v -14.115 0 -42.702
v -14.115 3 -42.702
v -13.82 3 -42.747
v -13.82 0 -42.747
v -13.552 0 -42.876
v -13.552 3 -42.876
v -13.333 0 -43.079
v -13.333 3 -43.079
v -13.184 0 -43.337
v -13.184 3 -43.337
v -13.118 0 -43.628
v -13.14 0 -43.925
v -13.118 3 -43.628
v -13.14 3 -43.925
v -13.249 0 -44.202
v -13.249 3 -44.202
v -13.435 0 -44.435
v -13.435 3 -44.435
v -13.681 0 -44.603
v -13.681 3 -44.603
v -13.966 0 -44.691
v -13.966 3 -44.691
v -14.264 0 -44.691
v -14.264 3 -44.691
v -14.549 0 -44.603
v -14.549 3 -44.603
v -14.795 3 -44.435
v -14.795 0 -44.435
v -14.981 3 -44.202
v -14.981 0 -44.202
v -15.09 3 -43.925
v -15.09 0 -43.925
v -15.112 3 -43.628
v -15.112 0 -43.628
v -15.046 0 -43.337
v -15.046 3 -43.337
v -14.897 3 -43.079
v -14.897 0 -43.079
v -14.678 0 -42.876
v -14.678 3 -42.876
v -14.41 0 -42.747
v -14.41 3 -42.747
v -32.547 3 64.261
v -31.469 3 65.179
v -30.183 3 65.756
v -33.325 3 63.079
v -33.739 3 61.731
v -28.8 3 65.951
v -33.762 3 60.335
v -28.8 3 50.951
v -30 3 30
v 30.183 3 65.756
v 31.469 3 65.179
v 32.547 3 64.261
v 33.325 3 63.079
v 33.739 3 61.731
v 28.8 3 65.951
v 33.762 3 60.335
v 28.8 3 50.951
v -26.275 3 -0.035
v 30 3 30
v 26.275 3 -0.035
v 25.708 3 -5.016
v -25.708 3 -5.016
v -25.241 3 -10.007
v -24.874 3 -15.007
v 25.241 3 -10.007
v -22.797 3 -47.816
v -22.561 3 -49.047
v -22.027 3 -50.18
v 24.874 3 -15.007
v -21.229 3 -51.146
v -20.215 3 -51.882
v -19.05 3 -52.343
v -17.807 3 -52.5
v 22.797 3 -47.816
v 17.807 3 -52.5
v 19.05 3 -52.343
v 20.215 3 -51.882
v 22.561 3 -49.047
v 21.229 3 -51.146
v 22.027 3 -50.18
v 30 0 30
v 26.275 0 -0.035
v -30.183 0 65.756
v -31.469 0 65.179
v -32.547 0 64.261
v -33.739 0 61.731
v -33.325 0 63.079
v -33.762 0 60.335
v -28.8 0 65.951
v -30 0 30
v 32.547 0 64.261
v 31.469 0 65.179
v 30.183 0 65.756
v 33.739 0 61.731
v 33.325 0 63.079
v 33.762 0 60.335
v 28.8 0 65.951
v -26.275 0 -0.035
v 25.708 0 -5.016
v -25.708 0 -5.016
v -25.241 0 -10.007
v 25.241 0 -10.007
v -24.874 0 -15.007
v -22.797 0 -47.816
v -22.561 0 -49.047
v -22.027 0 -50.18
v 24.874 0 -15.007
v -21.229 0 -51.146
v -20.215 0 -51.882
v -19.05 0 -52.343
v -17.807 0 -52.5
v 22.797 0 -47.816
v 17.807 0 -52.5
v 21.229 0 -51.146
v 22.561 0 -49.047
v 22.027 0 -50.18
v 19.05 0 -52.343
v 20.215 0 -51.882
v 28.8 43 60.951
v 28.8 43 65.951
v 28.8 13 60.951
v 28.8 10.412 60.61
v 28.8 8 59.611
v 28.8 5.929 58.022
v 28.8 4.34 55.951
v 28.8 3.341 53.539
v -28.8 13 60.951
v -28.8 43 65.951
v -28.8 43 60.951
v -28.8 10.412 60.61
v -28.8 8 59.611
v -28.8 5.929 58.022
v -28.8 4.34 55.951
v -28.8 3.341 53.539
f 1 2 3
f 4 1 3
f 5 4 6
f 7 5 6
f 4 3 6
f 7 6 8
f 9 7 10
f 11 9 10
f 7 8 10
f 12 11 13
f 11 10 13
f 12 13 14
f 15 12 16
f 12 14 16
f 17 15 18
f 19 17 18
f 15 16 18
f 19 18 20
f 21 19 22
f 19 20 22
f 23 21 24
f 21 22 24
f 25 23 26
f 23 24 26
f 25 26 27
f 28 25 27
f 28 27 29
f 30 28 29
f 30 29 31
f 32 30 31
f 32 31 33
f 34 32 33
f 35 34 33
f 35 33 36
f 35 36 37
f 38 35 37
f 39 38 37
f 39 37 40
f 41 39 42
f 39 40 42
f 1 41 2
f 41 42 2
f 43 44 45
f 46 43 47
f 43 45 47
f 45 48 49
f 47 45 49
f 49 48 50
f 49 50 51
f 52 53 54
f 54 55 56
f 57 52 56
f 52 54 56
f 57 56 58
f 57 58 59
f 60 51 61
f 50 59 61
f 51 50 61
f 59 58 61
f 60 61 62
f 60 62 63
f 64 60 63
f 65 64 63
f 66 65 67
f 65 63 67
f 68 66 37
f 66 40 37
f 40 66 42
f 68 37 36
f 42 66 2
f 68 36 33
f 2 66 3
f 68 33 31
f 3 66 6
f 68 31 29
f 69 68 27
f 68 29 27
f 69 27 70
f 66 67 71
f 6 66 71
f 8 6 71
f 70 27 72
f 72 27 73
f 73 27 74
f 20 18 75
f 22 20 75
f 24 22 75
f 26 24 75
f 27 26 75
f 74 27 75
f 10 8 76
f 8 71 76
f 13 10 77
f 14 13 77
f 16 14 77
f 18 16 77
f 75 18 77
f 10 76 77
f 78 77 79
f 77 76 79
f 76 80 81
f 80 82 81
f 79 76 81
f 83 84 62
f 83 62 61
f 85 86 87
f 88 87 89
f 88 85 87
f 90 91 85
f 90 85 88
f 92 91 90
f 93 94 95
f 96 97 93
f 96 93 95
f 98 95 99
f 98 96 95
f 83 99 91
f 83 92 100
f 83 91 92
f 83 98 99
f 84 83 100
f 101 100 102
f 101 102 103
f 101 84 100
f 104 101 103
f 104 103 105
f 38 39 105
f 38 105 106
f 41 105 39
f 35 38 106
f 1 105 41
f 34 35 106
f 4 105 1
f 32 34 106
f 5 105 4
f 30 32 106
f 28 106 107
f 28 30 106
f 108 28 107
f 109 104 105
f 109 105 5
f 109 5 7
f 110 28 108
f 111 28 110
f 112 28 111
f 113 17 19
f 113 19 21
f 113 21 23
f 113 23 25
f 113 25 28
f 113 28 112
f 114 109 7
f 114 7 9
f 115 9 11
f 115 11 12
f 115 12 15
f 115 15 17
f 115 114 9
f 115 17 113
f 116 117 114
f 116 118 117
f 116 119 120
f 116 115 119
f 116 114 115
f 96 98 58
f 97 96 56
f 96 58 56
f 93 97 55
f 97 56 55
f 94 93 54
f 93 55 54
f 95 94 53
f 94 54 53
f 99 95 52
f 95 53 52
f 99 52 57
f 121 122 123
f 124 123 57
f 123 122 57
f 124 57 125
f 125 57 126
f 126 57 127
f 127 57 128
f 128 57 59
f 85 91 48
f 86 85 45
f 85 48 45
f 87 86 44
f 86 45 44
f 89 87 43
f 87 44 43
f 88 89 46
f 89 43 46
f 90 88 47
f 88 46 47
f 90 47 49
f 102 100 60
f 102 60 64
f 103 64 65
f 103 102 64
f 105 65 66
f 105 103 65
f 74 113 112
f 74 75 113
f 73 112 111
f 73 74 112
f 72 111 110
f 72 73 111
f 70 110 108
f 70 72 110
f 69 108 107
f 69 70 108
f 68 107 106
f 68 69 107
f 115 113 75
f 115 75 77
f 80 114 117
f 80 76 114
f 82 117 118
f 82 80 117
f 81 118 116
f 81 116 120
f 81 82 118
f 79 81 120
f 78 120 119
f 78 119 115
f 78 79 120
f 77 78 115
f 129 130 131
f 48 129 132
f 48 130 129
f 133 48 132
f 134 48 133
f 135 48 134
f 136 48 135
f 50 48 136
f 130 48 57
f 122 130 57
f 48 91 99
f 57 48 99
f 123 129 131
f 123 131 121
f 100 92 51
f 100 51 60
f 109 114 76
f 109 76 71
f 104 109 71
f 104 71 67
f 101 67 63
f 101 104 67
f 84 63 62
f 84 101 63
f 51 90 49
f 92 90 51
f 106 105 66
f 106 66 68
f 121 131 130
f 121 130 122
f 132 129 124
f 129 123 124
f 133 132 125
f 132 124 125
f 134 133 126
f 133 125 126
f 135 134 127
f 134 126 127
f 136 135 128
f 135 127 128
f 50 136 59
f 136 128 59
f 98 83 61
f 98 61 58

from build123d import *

# Parameters (mm, degrees)
BOSS_EXTRUDE1_DEPTH = 3
FILLET1_R           = 250
FILLET2_R           = 5
SKETCH2_R           = 1
CUT_EXTRUDE1_DEPTH  = 3
SKETCH3_W           = 57.60029736
SKETCH3_H           = 5
BOSS_EXTRUDE2_DEPTH = 40
FILLET3_R           = 10


with BuildPart() as part:
    # Sketch1 → Boss-Extrude1 (new body)
    with BuildSketch(Plane(origin=(0, 0, 0), x_dir=(1, 0, 0), z_dir=(0, 1, 0))):
        Polygon((-22.5, 52.5), (22.5, 52.5), (25.349290321, 7.5), (30, -30), (34.417386739, -65.618650519), (30, -65.950548022), (-30, -65.950548022), (-34.417386739, -65.618650519), (-30, -30), (-25.349290321, 7.5), align=None)
    extrude(amount=BOSS_EXTRUDE1_DEPTH)

    # Fillet1
    # the kernel refuses this fillet: 250 mm, written as the material it adds along each edge
    with BuildSketch(Plane(origin=(-25.349290321, 0, -7.5), x_dir=(-0.12307603906737652, 0, 0.9923972433493987), z_dir=(0, 1, 0))) as fillet1_piece_1:
        with BuildLine():
            CenterArc((FILLET1_R * 0.0300869468275, -FILLET1_R), FILLET1_R, 90, 3.446670391)
            Line((-FILLET1_R * 0.0300325252162, -FILLET1_R * 0.00180881135867), (0, 0))
            Line((0, 0), (FILLET1_R * 0.0300869468274, 0))
        make_face()
    extrude(amount=3)
    with BuildSketch(Plane(origin=(25.349290321, 0, -7.5), x_dir=(0.12307603906732778, 0, 0.9923972433494047), z_dir=(0, 1, 0))) as fillet1_piece_2:
        with BuildLine():
            CenterArc((FILLET1_R * 0.0300869468274, FILLET1_R), FILLET1_R, 266.553329609, 3.446670391)
            Line((-FILLET1_R * 0.0300325252162, FILLET1_R * 0.00180881135867), (0, 0))
            Line((0, 0), (FILLET1_R * 0.0300869468274, 0))
        make_face()
    extrude(amount=3)

    # Fillet2
    fillet2_edges = [part.edges().sort_by_distance(p)[0] for p in [
        (-22.5, 1.5, -52.5),
        (-34.417386739, 1.5, 65.618650519),
        (34.417386739, 1.5, 65.618650519),
        (22.5, 1.5, -52.5),
    ]]
    fillet(fillet2_edges, radius=FILLET2_R)

    # Sketch2 → Cut-Extrude1 (cut)
    with BuildSketch(Plane(origin=(0, 3, 0), x_dir=(1, 0, 0), z_dir=(0, 1, 0))):
        with Locations(Location((-14.115125166, 43.702233324, 0), (0, 0, 270))):
            Circle(SKETCH2_R)
    extrude(amount=-CUT_EXTRUDE1_DEPTH, mode=Mode.SUBTRACT)

    # Sketch3 → Boss-Extrude2 (add)
    with BuildSketch(Plane(origin=(0, 3, 0), x_dir=(1, 0, 0), z_dir=(0, 1, 0))):
        with Locations((0, -63.450548022)):
            Rectangle(SKETCH3_W, SKETCH3_H)
    extrude(amount=BOSS_EXTRUDE2_DEPTH)

    # Fillet3
    fillet3_edges = [part.edges().sort_by_distance(p)[0] for p in [
        (0, 3, 60.950548022),
    ]]
    fillet(fillet3_edges, radius=FILLET3_R)


solid = part.part
